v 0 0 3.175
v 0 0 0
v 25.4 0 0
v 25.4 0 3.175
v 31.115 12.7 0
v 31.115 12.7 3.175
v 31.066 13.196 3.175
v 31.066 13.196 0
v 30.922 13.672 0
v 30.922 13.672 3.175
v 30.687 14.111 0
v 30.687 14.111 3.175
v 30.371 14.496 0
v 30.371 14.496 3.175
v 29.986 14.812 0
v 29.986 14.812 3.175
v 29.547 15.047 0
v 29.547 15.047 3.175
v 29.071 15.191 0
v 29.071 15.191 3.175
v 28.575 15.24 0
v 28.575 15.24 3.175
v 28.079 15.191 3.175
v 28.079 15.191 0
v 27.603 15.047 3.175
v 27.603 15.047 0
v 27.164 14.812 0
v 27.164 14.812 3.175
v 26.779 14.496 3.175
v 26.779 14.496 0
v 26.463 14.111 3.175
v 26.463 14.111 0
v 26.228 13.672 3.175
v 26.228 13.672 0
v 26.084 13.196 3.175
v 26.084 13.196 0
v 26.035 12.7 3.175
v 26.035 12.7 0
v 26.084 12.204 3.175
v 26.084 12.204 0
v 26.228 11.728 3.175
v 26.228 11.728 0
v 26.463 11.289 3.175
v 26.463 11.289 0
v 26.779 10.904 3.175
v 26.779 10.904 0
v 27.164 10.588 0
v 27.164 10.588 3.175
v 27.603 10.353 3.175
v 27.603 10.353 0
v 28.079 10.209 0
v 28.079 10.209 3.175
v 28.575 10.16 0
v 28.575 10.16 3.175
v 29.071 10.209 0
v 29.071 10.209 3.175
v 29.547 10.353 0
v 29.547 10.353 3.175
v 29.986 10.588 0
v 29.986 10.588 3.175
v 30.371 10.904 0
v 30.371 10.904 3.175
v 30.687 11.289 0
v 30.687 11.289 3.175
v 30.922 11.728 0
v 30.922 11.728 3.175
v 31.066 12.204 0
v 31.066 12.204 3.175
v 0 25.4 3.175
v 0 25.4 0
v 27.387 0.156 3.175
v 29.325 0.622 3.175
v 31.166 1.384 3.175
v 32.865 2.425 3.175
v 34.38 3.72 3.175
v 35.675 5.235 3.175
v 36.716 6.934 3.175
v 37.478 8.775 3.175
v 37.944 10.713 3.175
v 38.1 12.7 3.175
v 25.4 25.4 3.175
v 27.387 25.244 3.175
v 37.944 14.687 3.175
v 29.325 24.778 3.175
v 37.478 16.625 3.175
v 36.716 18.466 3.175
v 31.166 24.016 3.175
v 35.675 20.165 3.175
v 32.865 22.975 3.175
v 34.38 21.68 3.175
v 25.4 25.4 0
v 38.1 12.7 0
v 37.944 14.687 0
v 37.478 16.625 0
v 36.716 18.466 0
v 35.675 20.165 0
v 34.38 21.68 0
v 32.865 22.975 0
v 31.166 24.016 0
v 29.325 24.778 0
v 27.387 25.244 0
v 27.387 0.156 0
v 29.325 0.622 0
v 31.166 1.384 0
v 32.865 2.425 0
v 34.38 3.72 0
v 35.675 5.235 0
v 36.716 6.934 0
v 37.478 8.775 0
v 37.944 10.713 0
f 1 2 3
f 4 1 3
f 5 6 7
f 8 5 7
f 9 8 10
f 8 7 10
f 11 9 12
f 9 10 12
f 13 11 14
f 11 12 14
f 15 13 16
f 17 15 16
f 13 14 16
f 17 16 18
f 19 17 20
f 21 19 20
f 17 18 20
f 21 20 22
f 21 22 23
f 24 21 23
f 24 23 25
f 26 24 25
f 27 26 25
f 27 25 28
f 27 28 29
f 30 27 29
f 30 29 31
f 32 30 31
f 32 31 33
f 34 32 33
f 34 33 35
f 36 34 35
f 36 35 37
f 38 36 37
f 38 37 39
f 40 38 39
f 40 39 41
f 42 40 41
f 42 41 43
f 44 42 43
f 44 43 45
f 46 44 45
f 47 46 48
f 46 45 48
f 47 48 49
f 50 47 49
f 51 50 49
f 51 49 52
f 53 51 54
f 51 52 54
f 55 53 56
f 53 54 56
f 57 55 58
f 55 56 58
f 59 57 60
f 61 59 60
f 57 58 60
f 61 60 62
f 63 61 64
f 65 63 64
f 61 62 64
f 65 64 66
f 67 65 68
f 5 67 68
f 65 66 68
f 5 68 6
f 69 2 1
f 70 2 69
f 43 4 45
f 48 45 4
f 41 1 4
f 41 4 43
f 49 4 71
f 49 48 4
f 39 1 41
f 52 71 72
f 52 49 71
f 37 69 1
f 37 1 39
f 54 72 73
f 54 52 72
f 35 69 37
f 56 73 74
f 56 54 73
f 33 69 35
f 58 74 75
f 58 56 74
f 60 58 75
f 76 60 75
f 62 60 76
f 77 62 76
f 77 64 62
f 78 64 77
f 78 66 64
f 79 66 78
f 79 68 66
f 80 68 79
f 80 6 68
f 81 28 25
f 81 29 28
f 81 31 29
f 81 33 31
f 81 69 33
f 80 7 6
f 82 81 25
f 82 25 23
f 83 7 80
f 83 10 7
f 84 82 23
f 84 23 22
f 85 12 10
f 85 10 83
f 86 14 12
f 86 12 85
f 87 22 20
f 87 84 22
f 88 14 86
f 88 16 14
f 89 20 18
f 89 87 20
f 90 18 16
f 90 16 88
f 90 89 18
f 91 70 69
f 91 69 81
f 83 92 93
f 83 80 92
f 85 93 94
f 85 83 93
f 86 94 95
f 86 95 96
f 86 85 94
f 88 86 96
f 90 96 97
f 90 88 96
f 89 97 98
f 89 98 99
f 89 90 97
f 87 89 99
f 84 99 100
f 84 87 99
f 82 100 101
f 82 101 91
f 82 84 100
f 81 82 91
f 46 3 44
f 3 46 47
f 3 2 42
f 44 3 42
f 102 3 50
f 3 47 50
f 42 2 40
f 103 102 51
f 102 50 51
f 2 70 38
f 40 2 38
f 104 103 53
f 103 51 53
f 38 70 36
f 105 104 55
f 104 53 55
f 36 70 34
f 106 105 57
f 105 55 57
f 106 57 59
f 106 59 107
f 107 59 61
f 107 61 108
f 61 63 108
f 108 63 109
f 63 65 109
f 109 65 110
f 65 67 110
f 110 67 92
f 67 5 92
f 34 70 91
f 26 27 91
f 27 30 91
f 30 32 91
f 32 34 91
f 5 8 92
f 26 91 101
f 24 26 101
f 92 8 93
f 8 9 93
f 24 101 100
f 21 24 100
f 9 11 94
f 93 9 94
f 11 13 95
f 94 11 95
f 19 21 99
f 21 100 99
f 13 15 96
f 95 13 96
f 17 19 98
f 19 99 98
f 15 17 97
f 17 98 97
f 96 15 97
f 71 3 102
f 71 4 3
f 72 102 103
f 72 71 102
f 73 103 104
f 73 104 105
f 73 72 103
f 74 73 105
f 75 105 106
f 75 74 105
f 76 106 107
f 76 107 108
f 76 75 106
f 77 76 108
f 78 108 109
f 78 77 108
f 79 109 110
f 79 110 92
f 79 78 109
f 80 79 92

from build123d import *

# Parameters (mm, degrees)
SKETCH1_W           = 38.1
SKETCH1_H           = 25.4
BOSS_EXTRUDE1_DEPTH = 3.175
FILLET1_R           = 12.7
SKETCH2_R           = 2.54
CUT_EXTRUDE1_DEPTH  = 46.900442536


with BuildPart() as part:
    # Sketch1 → Boss-Extrude1 (new body)
    with BuildSketch(Plane.XY):
        with Locations((19.05, 12.7)):
            Rectangle(SKETCH1_W, SKETCH1_H)
    extrude(amount=BOSS_EXTRUDE1_DEPTH)

    # Fillet1
    fillet1_edges = [part.edges().sort_by_distance(p)[0] for p in [
        (38.1, 0, 1.5875),
        (38.1, 25.4, 1.5875),
    ]]
    fillet(fillet1_edges, radius=FILLET1_R - 0.0001)  # a hair under: the kernel refuses the full size

    # Sketch2 → Cut-Extrude1 (cut, through all)
    with BuildSketch(Plane.XY.offset(3.175)):
        with Locations((28.575, 12.7)):
            Circle(SKETCH2_R)
    extrude(amount=-CUT_EXTRUDE1_DEPTH, mode=Mode.SUBTRACT)


solid = part.part
